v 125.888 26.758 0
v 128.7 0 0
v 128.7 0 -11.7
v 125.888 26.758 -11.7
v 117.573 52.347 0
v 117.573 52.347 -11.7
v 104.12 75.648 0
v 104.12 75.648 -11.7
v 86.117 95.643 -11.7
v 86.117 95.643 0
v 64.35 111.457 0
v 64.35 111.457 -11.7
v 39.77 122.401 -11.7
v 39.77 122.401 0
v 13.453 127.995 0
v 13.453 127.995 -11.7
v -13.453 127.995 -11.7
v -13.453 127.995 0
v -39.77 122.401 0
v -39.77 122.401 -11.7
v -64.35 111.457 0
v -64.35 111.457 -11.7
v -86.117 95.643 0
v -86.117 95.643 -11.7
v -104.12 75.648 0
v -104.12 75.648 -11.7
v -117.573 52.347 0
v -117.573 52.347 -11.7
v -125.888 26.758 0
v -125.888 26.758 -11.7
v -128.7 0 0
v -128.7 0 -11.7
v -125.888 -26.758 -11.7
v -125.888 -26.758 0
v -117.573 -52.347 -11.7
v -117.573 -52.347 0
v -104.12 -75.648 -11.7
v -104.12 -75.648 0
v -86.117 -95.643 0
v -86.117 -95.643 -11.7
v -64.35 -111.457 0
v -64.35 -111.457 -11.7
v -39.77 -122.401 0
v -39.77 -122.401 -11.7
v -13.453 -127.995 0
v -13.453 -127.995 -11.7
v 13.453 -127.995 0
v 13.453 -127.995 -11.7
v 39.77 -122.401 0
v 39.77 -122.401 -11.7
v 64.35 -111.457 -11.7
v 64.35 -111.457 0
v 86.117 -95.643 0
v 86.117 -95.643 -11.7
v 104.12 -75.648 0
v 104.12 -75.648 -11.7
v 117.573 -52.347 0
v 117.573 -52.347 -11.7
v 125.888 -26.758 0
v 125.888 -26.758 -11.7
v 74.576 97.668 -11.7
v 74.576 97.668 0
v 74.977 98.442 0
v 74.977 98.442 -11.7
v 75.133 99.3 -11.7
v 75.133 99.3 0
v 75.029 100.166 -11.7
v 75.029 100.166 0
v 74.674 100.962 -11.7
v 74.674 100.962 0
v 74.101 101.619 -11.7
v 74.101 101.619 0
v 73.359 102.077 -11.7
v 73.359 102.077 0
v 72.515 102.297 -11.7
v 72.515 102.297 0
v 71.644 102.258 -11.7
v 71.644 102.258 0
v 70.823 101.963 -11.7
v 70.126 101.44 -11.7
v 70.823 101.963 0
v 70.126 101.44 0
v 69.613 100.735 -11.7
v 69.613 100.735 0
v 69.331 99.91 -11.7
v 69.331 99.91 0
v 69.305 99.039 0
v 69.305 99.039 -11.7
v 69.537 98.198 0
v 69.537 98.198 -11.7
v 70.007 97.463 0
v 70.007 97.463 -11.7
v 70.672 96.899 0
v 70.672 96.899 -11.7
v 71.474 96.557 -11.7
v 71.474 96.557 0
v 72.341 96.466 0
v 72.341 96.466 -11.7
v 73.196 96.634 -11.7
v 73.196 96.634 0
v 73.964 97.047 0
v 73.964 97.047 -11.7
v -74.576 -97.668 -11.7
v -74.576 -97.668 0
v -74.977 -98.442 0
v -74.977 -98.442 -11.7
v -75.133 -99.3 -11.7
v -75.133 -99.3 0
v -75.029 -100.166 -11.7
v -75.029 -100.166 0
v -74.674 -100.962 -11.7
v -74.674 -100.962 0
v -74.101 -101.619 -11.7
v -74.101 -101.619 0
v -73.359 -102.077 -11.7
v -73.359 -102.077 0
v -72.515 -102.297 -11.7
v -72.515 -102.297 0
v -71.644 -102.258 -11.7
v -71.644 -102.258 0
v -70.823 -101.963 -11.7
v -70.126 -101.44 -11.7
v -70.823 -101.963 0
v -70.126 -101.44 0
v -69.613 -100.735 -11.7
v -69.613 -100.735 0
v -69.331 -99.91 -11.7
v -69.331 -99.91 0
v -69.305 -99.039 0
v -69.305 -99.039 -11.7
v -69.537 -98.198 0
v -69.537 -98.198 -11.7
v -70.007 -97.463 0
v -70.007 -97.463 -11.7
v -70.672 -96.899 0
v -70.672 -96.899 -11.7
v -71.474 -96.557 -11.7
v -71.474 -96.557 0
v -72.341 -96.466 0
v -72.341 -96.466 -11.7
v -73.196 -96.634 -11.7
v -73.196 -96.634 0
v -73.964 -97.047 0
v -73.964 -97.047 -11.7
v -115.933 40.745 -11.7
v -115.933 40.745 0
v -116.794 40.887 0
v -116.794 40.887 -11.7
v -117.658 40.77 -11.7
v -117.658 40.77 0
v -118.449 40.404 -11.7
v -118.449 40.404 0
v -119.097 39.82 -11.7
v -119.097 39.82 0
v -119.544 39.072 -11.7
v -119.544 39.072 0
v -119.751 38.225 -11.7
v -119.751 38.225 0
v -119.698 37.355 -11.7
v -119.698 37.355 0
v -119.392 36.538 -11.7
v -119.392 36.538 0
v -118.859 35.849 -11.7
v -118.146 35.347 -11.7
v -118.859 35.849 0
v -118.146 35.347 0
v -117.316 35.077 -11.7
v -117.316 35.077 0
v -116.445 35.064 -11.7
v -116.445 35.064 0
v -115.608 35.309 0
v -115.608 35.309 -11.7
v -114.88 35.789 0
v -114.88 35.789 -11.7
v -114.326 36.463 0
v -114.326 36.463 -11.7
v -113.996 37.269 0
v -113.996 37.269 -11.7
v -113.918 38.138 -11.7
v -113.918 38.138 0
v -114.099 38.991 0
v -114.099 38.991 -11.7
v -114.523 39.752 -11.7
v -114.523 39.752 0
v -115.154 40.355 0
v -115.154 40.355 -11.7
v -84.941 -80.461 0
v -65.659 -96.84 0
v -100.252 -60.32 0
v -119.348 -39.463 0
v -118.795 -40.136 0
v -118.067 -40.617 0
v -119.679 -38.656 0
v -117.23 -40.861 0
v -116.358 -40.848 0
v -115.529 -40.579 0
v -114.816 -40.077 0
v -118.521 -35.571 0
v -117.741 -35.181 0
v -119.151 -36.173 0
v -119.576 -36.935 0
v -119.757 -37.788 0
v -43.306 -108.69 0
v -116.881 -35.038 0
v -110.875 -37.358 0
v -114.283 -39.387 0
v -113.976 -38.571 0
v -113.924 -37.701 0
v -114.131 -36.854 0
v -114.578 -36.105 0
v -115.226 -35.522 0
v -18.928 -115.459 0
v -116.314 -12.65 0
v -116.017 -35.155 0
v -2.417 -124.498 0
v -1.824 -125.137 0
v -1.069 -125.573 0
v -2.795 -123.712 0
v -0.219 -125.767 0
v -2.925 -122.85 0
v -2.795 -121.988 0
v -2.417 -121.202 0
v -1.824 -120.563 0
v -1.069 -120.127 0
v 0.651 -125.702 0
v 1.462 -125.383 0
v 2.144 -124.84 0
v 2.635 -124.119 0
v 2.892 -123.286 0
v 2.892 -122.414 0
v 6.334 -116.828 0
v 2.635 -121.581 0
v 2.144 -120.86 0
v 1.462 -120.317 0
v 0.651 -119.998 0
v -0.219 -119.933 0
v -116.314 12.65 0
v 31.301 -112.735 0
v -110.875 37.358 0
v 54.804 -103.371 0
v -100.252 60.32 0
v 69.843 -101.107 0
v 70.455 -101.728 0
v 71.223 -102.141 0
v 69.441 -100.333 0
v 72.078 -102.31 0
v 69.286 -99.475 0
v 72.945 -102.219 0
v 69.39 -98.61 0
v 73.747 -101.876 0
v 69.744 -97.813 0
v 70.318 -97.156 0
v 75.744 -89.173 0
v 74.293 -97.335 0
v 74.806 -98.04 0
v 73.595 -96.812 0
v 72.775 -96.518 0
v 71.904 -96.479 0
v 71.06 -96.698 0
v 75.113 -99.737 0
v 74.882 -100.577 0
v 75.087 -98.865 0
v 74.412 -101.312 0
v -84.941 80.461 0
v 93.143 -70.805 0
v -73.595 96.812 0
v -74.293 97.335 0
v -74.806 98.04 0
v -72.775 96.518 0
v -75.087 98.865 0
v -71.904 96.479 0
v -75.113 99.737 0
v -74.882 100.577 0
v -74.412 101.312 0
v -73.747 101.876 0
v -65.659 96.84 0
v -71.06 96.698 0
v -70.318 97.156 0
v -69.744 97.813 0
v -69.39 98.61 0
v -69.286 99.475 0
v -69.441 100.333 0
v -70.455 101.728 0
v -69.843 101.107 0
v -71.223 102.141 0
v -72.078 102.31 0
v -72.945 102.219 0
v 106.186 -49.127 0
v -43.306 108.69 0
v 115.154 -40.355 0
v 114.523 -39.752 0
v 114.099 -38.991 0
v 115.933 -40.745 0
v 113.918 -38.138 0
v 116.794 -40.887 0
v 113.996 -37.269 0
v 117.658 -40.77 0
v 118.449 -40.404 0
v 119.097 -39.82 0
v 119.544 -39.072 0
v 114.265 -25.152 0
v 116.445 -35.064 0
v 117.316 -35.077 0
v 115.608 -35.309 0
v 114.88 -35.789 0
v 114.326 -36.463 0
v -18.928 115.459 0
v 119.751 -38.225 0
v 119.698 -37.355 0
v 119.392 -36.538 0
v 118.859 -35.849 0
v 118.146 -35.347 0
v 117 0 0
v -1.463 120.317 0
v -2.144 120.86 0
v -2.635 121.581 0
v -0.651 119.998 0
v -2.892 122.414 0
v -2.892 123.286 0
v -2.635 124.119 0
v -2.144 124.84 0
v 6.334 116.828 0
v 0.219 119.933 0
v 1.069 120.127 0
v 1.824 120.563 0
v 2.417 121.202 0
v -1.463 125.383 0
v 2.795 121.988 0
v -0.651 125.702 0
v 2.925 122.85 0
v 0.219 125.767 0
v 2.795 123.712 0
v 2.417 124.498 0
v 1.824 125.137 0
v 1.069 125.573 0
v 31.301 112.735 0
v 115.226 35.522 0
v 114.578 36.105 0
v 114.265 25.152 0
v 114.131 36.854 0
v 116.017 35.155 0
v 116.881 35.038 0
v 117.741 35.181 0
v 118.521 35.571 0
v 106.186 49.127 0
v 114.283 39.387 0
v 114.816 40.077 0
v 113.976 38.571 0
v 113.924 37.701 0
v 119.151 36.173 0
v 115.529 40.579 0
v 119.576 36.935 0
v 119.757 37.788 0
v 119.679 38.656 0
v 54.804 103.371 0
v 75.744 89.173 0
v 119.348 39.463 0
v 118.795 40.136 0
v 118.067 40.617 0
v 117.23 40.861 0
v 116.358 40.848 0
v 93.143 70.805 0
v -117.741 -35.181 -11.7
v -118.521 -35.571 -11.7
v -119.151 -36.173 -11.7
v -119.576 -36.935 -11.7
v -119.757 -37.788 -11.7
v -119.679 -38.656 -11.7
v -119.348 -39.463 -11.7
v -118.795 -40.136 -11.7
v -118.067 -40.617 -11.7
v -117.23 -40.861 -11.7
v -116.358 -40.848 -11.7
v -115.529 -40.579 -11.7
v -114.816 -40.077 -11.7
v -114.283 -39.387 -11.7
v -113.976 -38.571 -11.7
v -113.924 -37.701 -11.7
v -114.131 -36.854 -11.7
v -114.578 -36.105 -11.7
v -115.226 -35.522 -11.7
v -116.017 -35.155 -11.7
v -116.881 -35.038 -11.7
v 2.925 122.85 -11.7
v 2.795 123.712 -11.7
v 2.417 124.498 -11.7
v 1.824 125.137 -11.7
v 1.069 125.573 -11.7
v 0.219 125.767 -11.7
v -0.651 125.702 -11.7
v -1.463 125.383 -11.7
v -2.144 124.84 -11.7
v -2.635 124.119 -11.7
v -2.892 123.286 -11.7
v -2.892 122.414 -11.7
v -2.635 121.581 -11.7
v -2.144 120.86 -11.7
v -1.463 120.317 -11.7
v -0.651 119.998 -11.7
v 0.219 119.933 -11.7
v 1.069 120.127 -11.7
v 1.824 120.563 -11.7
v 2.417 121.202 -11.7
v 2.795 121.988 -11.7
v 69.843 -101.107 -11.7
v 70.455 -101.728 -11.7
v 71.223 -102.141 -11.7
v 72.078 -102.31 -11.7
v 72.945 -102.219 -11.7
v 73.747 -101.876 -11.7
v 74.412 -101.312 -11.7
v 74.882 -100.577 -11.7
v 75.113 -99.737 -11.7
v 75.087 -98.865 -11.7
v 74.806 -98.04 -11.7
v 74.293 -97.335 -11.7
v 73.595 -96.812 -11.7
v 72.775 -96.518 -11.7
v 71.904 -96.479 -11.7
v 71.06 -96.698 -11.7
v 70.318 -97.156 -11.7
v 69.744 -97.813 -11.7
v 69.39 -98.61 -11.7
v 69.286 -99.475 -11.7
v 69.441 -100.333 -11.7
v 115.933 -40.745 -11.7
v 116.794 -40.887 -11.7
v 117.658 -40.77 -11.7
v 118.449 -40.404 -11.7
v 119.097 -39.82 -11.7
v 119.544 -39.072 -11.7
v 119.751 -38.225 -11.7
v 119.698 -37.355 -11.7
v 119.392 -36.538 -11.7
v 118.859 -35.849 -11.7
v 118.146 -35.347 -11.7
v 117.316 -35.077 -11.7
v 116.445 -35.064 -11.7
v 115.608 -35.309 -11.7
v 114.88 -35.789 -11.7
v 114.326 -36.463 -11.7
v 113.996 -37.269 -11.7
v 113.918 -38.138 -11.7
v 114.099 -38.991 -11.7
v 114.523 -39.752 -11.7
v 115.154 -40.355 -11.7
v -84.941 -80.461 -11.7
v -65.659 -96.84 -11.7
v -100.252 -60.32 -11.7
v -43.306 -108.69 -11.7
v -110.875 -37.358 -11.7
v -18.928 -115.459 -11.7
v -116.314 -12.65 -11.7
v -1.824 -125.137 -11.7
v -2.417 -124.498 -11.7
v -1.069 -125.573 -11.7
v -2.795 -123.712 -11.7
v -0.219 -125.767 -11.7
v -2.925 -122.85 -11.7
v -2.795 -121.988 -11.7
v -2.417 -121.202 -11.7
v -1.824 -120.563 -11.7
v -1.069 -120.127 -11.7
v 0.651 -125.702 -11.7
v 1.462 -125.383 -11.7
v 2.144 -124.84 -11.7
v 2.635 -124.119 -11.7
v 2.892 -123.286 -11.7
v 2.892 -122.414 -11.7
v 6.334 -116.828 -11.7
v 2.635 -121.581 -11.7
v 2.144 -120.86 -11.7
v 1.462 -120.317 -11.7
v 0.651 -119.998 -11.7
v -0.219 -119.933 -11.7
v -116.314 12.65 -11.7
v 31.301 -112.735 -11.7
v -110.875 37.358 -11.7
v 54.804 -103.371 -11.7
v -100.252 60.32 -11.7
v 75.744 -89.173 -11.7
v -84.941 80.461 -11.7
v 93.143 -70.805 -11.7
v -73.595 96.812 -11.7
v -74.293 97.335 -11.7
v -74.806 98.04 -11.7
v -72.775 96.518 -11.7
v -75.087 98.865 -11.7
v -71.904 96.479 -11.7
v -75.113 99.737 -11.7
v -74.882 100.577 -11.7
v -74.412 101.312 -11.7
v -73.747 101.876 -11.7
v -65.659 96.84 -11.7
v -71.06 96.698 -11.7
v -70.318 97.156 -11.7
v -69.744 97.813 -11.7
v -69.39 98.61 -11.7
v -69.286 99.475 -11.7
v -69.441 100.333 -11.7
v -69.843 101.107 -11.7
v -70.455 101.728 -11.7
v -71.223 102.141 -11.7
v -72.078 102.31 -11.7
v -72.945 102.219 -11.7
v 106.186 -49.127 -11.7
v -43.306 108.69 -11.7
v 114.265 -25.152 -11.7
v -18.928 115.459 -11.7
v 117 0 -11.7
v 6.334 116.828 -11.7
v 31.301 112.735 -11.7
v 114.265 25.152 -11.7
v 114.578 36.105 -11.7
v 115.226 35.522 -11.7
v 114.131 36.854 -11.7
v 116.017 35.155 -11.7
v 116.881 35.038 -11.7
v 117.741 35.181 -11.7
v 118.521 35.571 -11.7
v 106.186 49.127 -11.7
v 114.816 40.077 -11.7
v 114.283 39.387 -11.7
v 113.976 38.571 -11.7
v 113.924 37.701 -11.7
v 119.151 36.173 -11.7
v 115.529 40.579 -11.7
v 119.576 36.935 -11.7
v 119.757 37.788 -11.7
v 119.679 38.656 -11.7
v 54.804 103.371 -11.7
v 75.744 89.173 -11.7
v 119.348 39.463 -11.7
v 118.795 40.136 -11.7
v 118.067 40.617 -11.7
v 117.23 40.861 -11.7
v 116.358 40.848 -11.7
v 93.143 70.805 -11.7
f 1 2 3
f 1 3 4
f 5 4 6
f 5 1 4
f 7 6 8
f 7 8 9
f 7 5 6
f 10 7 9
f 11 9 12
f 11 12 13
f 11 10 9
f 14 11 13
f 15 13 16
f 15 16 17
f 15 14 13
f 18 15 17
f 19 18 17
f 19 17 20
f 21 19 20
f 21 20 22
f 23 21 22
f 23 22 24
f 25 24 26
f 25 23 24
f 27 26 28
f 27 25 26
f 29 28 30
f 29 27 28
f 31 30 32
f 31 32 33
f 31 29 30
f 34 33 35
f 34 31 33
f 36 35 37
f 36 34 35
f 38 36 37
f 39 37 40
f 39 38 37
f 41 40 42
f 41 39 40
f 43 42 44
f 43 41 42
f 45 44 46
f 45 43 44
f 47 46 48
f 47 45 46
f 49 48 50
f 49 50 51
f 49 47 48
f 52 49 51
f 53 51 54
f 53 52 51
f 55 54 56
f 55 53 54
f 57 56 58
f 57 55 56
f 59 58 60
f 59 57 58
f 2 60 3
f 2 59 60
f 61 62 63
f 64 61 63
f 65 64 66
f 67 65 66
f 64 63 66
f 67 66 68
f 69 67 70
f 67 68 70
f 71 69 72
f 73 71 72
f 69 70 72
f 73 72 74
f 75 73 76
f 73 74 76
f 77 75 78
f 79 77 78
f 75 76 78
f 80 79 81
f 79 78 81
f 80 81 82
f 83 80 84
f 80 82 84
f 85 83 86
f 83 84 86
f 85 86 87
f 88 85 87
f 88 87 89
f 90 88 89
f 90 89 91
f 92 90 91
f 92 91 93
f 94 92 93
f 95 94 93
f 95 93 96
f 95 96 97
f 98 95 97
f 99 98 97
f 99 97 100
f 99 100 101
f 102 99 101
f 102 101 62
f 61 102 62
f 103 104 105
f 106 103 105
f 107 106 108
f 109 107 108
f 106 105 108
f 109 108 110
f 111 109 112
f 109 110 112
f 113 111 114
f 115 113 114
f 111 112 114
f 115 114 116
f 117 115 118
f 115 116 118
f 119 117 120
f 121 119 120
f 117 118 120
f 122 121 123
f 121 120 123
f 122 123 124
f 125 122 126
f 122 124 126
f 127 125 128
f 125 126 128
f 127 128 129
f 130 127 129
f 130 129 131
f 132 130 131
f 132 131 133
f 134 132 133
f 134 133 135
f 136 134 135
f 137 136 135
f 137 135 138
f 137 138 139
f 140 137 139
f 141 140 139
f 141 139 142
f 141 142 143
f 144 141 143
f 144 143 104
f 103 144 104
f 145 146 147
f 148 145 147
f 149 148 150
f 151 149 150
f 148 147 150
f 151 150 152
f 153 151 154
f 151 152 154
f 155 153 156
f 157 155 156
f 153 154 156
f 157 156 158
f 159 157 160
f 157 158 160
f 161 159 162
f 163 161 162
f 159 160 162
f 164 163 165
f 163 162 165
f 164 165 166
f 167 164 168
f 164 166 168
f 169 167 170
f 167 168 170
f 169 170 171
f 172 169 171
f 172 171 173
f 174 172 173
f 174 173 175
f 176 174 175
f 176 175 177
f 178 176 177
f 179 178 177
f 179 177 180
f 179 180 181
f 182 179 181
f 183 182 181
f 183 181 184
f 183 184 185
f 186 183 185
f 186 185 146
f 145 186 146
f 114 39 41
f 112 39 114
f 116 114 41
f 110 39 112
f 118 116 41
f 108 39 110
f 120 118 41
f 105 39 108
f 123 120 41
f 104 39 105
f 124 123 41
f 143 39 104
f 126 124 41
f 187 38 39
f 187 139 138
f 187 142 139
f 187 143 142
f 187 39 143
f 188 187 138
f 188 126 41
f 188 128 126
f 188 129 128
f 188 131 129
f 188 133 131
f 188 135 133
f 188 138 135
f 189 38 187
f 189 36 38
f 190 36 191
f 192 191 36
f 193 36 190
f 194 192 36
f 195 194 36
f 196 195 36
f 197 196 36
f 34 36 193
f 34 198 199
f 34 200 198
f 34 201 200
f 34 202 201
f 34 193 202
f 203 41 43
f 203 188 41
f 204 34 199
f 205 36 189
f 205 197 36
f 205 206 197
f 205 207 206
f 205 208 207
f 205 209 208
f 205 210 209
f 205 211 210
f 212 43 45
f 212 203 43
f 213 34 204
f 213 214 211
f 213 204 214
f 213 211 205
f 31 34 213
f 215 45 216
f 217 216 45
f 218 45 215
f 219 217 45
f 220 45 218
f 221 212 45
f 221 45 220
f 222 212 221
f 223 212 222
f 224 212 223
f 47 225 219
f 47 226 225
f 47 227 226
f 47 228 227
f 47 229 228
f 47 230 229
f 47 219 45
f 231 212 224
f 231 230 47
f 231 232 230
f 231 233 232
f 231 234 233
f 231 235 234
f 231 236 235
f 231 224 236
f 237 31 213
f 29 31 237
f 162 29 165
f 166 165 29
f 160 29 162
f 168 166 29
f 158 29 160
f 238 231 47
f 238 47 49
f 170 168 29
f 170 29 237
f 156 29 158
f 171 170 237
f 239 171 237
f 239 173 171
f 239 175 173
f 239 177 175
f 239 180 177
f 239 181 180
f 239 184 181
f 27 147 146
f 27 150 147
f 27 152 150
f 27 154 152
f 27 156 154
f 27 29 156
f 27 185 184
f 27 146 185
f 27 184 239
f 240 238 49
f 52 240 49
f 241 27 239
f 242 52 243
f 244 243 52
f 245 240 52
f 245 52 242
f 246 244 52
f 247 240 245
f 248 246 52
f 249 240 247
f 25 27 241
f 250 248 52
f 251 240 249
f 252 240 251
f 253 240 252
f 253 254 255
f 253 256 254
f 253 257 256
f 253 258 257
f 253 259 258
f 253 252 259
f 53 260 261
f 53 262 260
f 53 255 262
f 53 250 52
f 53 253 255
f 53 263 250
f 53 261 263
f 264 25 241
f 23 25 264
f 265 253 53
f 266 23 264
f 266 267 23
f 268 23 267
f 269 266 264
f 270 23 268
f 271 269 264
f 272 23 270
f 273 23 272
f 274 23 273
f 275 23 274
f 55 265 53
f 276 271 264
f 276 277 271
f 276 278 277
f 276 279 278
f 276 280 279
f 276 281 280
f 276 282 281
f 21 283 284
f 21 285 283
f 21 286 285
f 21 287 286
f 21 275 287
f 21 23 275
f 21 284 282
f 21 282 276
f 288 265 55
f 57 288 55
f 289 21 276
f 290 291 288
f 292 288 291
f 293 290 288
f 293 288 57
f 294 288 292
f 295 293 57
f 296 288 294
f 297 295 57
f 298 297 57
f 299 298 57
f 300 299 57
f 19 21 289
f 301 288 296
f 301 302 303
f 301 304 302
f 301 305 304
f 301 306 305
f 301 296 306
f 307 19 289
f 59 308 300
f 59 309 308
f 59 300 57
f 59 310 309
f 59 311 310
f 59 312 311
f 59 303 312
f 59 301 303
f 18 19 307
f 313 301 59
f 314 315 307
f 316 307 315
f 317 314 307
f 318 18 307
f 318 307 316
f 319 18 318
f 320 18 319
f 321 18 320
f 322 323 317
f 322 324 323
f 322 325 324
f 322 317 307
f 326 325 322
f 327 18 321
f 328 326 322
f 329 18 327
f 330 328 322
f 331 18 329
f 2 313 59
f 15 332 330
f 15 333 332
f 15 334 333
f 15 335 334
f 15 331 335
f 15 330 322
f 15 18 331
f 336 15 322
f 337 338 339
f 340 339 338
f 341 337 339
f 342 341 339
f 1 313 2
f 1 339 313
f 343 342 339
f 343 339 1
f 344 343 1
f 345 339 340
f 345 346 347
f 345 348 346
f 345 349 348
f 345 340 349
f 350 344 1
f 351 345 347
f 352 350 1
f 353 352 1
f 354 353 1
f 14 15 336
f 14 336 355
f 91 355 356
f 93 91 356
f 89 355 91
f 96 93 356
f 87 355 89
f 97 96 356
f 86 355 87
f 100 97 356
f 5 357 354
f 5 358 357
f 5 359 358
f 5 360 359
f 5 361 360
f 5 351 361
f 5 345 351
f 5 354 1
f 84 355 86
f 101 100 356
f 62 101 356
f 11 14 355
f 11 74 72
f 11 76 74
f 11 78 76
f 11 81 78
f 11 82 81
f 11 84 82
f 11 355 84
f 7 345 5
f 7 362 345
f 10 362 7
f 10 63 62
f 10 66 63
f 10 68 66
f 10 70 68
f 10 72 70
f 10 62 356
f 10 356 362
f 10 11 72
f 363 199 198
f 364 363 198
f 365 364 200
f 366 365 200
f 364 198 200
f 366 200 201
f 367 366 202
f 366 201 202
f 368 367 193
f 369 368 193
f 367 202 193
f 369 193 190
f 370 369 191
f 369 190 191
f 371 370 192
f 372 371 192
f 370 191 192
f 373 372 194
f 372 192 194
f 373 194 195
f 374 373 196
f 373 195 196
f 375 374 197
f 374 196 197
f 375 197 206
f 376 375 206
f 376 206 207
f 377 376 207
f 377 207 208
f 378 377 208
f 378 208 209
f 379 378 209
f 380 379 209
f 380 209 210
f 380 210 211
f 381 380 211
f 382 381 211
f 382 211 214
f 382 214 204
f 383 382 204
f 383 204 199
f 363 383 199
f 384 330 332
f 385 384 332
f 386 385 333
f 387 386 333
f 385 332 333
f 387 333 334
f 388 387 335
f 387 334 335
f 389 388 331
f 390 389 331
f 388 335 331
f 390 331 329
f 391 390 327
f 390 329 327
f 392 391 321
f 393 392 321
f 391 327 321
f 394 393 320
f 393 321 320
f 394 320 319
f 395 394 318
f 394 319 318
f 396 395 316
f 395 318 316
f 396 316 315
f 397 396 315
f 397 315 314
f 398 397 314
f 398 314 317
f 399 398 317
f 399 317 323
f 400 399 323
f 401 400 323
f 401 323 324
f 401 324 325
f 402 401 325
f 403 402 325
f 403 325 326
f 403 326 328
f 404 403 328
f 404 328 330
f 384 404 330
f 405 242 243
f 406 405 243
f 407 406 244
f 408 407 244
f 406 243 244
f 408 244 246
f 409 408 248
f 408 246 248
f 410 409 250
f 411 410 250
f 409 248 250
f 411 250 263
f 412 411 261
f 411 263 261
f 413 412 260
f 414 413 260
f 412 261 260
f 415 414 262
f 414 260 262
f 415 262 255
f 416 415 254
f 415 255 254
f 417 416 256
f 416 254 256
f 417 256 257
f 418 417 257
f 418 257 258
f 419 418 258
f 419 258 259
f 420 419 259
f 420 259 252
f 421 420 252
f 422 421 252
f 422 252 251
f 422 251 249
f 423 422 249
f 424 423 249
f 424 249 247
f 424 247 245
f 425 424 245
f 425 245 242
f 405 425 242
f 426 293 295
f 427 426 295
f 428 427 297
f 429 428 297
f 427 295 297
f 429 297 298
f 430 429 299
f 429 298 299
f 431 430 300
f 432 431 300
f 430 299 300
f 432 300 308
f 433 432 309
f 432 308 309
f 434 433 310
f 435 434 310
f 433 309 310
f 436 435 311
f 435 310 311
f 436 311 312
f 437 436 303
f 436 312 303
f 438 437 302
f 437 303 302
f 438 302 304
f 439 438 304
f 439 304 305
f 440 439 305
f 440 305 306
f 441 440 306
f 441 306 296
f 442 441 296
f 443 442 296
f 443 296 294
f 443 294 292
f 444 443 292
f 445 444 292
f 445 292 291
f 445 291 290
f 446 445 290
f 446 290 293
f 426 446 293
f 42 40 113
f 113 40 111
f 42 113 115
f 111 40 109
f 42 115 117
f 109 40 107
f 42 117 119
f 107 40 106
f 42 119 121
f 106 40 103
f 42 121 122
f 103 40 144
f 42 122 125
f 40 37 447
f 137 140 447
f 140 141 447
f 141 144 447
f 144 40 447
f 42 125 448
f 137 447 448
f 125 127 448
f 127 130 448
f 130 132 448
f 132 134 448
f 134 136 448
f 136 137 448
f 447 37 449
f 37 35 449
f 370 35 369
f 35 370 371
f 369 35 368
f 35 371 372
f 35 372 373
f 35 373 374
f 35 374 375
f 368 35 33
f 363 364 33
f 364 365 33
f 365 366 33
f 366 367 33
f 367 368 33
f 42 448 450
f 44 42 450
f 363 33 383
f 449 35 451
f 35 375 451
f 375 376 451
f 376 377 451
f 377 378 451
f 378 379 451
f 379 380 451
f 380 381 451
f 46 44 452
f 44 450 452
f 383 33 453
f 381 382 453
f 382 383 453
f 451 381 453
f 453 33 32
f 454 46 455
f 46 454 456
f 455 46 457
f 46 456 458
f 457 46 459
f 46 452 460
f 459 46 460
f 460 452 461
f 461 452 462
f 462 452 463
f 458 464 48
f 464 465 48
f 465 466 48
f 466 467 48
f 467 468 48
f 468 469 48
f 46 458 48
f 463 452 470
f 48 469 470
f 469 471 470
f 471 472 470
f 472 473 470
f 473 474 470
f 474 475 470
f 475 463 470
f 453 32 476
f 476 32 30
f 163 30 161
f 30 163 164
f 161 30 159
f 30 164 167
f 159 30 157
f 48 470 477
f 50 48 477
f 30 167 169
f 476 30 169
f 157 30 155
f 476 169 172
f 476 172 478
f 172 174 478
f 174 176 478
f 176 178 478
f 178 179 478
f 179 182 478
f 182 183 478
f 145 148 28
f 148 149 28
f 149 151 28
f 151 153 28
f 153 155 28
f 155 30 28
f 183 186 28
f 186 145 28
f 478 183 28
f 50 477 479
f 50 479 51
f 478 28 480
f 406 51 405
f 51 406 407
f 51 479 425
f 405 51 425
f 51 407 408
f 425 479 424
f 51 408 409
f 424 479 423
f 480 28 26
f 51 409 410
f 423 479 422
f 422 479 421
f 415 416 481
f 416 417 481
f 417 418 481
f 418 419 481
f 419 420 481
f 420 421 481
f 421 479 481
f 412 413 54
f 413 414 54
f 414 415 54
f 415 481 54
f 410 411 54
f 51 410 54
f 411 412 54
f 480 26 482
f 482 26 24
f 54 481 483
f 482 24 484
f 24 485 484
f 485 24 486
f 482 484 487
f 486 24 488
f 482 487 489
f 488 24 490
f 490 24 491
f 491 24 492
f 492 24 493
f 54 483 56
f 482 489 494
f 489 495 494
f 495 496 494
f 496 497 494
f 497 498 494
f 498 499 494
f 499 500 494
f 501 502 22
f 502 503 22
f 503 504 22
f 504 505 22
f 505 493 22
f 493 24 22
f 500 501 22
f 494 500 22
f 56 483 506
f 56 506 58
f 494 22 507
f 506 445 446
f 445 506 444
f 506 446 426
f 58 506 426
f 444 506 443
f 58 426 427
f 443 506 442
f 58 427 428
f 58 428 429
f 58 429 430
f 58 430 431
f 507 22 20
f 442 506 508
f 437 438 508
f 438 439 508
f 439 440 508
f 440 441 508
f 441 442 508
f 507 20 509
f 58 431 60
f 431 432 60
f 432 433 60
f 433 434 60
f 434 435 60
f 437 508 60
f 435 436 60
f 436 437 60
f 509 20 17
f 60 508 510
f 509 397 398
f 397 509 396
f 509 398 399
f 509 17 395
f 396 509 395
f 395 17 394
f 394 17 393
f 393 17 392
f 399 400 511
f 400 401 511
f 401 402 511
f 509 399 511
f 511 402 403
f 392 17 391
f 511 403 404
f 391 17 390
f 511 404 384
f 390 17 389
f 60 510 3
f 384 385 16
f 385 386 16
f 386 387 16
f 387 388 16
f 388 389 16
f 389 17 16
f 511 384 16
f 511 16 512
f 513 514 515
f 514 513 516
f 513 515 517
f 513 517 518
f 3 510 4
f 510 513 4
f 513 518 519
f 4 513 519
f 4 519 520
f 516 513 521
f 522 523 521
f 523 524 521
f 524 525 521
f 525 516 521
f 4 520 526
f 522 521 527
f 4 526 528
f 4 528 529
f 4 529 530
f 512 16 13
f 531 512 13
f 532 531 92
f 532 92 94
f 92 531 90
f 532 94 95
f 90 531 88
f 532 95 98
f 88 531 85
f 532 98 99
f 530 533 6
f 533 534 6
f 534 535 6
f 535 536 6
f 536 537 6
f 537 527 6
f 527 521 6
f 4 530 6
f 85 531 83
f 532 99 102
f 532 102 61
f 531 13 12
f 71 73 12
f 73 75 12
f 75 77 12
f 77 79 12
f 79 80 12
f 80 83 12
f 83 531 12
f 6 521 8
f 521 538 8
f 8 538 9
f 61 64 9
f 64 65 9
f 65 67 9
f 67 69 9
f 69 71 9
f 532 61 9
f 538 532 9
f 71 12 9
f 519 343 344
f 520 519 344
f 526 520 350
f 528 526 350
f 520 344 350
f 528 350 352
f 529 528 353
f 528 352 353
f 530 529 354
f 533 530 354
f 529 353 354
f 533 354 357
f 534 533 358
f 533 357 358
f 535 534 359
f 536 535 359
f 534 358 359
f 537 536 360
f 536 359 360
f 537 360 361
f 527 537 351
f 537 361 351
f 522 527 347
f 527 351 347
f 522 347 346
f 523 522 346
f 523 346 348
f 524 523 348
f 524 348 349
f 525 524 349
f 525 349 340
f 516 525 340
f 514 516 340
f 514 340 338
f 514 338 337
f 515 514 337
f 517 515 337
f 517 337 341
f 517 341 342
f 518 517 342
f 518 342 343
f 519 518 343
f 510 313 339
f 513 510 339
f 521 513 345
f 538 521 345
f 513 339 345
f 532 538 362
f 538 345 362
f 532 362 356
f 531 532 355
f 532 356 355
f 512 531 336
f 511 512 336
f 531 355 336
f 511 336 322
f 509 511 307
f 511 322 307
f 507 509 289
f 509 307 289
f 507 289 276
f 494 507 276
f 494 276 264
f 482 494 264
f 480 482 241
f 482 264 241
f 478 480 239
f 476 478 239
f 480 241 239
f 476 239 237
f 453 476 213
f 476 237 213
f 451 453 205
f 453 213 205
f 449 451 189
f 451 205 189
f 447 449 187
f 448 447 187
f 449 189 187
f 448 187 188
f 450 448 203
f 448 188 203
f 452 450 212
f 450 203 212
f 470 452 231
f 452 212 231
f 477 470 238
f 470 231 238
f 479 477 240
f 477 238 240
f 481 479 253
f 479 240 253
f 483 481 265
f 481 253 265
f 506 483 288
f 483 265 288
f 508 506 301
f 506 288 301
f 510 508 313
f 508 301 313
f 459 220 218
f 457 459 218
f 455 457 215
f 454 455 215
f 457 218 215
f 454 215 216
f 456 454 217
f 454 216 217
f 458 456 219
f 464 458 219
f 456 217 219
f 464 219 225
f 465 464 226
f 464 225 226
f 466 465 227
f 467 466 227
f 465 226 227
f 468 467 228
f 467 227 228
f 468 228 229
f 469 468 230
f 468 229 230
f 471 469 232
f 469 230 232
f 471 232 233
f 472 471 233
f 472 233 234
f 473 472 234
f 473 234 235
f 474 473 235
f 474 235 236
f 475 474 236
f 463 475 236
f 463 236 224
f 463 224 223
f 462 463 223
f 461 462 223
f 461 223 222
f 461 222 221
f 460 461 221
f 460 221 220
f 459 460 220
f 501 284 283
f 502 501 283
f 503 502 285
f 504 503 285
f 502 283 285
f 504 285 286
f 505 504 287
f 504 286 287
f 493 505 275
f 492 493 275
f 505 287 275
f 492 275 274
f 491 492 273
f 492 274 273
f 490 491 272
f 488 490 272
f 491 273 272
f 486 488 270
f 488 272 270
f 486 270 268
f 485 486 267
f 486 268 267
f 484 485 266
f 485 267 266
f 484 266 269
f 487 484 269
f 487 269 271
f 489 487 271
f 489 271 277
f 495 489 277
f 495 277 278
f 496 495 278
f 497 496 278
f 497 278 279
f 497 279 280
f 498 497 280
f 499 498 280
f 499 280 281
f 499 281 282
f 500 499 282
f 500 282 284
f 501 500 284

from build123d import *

# Parameters (mm, degrees)
SKETCH_1_R               = 128.7
SKETCH_1_R_2             = 117
EXTRUDE_2_DEPTH          = 11.7
SKETCH_2_R               = 2.925
CUT_EXTRUDE_2_DEPTH      = 183.384950037
PATTERN_CIRCULAR_1_COUNT = 10


with BuildPart() as part:
    # Эскиз1 → Бобышка-Вытянуть2 (new body)
    with BuildSketch(Plane.XY):
        Circle(SKETCH_1_R)
        Circle(SKETCH_1_R_2, mode=Mode.SUBTRACT)
    extrude(amount=-EXTRUDE_2_DEPTH)

    # Эскиз2 → Вырез-Вытянуть2 (cut, through all)
    with BuildSketch(Plane.XY):
        with Locations((0, 122.85)):
            Circle(SKETCH_2_R)
    cut_extrude_2 = extrude(amount=-CUT_EXTRUDE_2_DEPTH, mode=Mode.SUBTRACT)

    # Круговой массив1: Вырез-Вытянуть2 ×10 about axis
    pattern_circular_1_axis = Axis((0, 0, 0), (0, 0, 1))
    for i in range(1, PATTERN_CIRCULAR_1_COUNT):
        add(cut_extrude_2.rotate(pattern_circular_1_axis, i * 360 / PATTERN_CIRCULAR_1_COUNT), mode=Mode.SUBTRACT)


solid = part.part
